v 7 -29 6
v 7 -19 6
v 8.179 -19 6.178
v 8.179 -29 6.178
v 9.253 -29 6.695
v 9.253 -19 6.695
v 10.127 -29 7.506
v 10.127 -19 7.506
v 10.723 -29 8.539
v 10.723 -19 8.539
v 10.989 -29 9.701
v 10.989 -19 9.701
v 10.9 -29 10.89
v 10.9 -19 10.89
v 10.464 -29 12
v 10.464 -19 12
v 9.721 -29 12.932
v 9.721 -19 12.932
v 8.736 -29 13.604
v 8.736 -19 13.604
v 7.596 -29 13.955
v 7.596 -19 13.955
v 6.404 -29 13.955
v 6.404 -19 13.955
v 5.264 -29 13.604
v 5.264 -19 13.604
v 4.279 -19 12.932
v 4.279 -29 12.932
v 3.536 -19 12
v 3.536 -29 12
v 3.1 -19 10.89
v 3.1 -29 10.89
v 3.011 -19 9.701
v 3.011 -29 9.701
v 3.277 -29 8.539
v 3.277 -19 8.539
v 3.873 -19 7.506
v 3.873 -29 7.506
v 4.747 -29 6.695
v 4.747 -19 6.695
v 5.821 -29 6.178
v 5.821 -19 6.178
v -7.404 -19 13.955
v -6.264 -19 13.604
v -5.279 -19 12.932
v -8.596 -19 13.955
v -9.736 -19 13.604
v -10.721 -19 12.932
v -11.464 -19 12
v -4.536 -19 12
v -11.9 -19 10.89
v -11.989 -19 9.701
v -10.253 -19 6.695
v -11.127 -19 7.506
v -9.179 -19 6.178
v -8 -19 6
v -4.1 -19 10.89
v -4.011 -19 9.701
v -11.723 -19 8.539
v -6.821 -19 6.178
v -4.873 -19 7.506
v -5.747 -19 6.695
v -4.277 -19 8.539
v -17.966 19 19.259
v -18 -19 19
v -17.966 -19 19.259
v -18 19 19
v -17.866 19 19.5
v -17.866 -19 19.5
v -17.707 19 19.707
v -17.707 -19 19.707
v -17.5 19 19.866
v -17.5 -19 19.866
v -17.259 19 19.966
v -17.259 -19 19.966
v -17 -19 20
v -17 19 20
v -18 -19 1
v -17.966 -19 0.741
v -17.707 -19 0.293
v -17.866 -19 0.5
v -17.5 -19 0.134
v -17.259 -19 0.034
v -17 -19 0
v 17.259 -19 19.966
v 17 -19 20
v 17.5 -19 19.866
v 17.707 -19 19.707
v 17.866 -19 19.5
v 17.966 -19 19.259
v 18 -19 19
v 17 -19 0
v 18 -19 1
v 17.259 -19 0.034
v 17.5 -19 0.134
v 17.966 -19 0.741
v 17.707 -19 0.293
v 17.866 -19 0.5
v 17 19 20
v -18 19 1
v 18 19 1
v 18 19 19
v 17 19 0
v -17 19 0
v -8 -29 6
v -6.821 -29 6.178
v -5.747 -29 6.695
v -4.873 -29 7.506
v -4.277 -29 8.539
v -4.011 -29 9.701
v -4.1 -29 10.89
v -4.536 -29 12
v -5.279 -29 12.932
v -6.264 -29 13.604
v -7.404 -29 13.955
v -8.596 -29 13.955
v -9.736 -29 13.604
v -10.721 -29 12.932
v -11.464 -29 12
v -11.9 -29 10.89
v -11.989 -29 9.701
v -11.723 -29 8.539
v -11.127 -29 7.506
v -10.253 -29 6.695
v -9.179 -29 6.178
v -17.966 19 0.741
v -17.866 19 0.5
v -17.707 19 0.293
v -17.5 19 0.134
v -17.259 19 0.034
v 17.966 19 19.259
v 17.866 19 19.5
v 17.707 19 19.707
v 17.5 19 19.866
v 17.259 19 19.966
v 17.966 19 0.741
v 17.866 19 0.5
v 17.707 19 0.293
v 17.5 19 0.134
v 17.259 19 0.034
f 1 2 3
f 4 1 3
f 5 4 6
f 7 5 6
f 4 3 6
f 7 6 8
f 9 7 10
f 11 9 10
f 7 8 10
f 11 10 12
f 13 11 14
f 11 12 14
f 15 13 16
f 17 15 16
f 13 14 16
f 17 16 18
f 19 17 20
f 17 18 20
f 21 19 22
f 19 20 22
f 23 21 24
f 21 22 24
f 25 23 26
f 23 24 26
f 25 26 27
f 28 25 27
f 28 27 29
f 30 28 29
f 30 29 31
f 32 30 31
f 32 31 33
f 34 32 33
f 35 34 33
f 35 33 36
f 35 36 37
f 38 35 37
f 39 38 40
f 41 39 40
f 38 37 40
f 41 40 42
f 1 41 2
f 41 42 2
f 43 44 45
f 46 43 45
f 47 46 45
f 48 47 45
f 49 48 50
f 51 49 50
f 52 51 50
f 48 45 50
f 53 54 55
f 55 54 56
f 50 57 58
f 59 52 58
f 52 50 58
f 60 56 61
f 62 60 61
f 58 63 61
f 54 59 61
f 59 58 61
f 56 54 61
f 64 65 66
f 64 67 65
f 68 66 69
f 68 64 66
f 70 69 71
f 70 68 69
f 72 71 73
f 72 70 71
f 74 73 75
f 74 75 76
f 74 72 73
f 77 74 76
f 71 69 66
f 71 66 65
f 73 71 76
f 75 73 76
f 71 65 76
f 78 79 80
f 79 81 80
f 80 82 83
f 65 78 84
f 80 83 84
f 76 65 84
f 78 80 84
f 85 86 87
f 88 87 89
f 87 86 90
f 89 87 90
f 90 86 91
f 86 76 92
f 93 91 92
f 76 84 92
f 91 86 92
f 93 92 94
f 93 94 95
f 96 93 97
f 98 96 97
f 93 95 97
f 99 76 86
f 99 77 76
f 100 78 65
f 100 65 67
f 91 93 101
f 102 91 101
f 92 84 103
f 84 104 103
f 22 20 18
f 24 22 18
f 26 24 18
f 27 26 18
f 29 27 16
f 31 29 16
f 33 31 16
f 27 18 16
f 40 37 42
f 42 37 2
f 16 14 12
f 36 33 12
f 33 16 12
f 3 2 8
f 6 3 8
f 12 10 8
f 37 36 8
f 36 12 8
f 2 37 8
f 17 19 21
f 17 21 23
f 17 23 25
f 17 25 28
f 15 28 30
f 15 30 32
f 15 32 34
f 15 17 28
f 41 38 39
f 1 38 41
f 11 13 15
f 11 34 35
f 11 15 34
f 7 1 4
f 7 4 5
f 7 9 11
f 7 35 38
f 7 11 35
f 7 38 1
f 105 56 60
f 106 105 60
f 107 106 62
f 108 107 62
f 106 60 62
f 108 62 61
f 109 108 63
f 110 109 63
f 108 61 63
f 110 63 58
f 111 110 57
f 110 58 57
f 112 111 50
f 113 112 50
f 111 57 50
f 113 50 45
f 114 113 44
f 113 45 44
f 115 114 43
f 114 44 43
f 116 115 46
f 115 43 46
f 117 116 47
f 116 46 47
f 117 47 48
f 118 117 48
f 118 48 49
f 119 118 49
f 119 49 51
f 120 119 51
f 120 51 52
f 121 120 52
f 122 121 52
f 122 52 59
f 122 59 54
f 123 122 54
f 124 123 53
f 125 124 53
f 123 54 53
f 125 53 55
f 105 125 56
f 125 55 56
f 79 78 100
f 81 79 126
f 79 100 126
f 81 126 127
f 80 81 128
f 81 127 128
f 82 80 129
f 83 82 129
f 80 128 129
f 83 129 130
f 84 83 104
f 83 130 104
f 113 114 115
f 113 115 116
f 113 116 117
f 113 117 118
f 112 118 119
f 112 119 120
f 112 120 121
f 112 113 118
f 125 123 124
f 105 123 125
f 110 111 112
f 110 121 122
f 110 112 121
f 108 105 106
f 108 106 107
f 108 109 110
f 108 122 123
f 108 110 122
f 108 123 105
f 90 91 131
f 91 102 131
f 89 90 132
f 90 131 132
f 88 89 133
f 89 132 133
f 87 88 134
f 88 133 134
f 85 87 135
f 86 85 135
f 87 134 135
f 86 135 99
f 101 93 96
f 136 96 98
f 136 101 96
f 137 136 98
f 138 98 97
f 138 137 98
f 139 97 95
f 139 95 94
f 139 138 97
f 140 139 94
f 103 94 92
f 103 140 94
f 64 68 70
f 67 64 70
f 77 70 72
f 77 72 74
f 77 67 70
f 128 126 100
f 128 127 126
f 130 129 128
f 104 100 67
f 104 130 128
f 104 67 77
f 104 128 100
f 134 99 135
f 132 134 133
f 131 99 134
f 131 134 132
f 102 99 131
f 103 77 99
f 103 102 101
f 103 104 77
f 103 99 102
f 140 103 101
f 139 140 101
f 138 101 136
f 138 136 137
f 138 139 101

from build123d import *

# Parameters (mm, degrees)
SKETCH1_W             = 36
SKETCH1_H             = 38
BOSS_EXTRUDE1_DEPTH   = 20
FILLET1_R             = 1
SKETCH2_R             = 4
BOSS_EXTRUDE2_DEPTH   = 10
BOSS_EXTRUDE2_2_DEPTH = 10


with BuildPart() as part:
    # Sketch1 → Boss-Extrude1 (new body)
    with BuildSketch(Plane.XY):
        Rectangle(SKETCH1_W, SKETCH1_H)
    extrude(amount=BOSS_EXTRUDE1_DEPTH)

    # Fillet1
    fillet1_edges = [part.edges().sort_by_distance(p)[0] for p in [
        (-18, 0, 20),
        (18, 0, 20),
        (-18, 0, 0),
        (18, 0, 0),
    ]]
    fillet(fillet1_edges, radius=FILLET1_R)


with BuildPart() as body_2:
    # Sketch2 → Boss-Extrude2 (new body)
    with BuildSketch(Plane.XZ.offset(19)):
        with Locations(Location((-8, 10, 0), (0, 0, 270))):
            Circle(SKETCH2_R)
    extrude(amount=BOSS_EXTRUDE2_DEPTH)


with BuildPart() as body_3:
    # Sketch2 → Boss-Extrude2 2 (new body)
    with BuildSketch(Plane.XZ.offset(19)):
        with Locations(Location((7, 10, 0), (0, 0, 270))):
            Circle(SKETCH2_R)
    extrude(amount=BOSS_EXTRUDE2_2_DEPTH)


solid = Compound([part.part, body_2.part, body_3.part])
